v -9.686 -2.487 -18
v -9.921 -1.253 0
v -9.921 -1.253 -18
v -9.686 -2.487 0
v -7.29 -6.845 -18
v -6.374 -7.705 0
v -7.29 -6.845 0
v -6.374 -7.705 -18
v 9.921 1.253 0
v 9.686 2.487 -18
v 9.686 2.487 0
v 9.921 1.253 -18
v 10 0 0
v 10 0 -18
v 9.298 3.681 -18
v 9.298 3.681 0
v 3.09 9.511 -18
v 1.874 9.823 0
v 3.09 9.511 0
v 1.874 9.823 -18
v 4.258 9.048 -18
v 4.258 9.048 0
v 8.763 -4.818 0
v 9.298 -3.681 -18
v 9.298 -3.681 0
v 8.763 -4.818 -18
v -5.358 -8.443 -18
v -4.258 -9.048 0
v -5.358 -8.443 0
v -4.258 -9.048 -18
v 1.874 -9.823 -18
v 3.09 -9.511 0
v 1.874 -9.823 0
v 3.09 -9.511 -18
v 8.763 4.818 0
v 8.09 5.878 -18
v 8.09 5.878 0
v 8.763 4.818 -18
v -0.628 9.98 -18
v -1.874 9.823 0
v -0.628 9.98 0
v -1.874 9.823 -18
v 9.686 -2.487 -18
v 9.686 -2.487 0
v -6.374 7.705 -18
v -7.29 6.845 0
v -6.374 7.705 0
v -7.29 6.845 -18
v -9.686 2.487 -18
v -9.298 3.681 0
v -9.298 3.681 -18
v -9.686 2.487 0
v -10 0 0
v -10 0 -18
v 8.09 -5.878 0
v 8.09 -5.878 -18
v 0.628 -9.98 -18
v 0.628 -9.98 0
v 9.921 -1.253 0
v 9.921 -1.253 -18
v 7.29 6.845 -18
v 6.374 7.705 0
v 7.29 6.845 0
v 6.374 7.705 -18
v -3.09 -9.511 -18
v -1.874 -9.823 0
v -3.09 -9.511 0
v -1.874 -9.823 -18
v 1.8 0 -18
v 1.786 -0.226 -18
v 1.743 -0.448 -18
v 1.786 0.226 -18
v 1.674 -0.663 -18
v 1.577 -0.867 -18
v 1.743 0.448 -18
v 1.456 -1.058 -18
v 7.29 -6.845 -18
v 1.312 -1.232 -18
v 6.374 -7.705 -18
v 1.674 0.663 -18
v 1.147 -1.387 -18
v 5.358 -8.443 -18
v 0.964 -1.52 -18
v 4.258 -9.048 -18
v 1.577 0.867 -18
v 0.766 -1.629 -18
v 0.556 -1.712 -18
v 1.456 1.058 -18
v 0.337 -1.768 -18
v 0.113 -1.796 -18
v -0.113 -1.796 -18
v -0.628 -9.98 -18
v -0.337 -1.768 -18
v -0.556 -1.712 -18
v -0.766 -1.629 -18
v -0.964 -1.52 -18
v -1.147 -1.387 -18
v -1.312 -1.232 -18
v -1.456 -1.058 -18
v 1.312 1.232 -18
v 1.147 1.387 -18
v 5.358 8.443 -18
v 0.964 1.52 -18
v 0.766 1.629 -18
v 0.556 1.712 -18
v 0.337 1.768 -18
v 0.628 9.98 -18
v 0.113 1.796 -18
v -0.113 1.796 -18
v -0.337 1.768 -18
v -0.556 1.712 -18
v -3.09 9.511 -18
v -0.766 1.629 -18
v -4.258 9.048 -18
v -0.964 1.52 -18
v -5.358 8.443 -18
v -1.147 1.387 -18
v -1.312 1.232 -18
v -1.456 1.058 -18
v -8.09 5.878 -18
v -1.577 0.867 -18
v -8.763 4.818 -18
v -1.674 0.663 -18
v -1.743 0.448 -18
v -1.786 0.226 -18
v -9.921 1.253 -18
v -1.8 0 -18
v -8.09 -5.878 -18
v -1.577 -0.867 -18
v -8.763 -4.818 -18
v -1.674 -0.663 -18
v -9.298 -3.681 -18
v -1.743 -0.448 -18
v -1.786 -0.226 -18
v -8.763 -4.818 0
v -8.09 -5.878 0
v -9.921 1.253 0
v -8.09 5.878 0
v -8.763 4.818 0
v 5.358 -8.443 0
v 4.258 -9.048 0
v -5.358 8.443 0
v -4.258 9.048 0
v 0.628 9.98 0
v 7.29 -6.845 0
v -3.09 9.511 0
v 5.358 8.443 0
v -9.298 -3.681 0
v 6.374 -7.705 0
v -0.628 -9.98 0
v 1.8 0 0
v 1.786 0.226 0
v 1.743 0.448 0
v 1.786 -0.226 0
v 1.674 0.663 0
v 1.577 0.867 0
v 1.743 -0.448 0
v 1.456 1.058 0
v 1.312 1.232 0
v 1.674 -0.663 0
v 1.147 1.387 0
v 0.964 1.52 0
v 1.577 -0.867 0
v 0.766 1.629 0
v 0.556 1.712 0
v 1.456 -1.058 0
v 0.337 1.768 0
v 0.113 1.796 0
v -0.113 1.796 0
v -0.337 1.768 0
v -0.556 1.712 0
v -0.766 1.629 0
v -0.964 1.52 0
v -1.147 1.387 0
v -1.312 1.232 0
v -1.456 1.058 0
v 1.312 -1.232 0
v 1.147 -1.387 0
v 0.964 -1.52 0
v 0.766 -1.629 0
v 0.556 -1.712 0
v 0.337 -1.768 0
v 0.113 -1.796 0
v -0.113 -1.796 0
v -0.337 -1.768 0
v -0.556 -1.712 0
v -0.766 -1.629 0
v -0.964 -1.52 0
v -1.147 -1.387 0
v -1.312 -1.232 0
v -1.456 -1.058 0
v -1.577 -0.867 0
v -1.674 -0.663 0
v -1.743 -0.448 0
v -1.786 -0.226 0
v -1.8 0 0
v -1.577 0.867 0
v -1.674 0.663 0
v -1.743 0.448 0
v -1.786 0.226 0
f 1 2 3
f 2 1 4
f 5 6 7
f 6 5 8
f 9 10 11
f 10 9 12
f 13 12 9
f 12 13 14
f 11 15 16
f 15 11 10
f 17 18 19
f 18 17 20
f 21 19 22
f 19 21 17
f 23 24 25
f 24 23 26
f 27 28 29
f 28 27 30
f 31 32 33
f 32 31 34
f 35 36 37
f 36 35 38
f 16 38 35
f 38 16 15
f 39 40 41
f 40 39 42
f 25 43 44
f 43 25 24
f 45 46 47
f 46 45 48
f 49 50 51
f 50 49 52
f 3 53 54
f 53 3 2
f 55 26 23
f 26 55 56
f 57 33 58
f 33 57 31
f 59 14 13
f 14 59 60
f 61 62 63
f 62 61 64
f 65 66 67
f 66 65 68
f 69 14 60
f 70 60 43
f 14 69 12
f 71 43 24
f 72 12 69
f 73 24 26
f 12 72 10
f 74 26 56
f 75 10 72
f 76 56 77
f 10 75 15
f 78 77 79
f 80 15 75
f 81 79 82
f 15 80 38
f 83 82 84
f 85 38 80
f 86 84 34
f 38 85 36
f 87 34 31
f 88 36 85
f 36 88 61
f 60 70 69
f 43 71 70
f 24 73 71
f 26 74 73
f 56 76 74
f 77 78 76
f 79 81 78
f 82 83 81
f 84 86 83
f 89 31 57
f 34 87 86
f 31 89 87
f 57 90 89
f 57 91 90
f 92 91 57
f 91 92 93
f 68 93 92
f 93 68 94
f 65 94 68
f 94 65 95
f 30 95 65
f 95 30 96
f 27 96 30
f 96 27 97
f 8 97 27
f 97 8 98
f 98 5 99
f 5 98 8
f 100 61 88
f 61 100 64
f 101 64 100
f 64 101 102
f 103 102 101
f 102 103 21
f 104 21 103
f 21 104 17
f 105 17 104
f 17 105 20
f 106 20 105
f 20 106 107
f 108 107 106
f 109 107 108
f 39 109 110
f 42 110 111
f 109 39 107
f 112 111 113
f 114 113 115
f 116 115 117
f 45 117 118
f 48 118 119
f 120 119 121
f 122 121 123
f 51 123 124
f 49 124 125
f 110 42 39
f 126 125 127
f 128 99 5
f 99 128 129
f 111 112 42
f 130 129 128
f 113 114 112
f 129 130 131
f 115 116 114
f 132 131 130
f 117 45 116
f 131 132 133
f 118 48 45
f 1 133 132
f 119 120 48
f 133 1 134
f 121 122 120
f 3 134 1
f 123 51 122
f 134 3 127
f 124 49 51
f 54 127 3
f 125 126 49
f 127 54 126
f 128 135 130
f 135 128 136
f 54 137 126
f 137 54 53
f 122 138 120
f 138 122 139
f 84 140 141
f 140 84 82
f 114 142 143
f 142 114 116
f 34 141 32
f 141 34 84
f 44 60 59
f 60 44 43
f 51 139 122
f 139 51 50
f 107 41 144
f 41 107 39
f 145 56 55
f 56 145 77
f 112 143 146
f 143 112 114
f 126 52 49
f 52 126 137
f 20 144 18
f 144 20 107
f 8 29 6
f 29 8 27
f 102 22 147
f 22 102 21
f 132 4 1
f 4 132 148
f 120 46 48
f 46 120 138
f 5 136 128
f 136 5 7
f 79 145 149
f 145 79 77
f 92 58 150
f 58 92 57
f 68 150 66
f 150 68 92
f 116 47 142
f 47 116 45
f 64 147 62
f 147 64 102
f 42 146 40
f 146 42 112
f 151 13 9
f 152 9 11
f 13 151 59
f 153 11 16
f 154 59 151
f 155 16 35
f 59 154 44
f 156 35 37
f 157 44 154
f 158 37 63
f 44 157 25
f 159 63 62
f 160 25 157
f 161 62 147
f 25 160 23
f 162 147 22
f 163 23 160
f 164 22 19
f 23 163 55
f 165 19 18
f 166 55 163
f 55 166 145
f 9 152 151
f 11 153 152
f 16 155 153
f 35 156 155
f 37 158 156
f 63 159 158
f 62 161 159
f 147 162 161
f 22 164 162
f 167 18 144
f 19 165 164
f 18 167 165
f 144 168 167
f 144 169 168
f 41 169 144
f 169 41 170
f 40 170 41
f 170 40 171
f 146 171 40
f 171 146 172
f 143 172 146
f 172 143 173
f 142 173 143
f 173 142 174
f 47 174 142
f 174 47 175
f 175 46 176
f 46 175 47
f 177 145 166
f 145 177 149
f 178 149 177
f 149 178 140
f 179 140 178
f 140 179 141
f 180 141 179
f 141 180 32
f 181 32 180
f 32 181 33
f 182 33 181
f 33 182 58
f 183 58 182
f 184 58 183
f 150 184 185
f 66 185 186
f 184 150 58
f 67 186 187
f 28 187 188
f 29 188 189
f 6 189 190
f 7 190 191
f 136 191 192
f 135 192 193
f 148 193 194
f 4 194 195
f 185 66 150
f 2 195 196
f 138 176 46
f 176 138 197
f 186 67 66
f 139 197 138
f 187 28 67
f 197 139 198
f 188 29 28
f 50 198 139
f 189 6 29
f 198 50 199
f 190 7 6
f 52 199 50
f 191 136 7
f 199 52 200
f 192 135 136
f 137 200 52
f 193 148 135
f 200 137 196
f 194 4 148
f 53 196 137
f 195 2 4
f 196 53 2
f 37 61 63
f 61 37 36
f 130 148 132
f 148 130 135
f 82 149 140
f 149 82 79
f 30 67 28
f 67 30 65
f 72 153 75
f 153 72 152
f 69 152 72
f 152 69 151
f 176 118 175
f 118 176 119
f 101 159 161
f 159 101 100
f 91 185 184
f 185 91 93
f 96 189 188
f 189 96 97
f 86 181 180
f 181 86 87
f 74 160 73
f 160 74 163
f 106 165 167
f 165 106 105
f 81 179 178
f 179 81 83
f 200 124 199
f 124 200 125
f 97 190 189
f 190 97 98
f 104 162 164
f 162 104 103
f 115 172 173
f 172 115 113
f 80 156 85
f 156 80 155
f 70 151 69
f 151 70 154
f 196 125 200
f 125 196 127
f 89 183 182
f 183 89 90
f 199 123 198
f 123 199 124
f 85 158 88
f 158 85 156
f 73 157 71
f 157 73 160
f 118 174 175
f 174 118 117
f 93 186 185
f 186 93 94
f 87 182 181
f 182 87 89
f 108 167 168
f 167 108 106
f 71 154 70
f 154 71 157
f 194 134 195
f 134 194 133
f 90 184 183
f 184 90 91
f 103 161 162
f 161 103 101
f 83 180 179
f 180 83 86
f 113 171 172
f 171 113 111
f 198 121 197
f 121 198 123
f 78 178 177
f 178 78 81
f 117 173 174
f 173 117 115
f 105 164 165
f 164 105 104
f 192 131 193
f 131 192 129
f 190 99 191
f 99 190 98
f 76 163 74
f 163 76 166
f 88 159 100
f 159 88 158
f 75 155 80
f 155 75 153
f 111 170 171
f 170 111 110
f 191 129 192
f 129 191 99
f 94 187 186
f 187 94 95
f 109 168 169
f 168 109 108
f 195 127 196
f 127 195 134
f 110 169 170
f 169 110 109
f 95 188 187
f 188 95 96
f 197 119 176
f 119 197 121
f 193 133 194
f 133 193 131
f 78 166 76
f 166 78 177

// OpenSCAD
$fn = 50;


difference() {
	union() {
		translate(v = [0, 0, -18.0000000000]) {
			cylinder(h = 18, r = 10.0000000000);
		}
		cylinder(h = 0, r = 20.0000000000);
	}
	union() {
		#translate(v = [0, 0, -18]) {
			cylinder(h = 18, r = 1.8000000000);
		}
	}
}
